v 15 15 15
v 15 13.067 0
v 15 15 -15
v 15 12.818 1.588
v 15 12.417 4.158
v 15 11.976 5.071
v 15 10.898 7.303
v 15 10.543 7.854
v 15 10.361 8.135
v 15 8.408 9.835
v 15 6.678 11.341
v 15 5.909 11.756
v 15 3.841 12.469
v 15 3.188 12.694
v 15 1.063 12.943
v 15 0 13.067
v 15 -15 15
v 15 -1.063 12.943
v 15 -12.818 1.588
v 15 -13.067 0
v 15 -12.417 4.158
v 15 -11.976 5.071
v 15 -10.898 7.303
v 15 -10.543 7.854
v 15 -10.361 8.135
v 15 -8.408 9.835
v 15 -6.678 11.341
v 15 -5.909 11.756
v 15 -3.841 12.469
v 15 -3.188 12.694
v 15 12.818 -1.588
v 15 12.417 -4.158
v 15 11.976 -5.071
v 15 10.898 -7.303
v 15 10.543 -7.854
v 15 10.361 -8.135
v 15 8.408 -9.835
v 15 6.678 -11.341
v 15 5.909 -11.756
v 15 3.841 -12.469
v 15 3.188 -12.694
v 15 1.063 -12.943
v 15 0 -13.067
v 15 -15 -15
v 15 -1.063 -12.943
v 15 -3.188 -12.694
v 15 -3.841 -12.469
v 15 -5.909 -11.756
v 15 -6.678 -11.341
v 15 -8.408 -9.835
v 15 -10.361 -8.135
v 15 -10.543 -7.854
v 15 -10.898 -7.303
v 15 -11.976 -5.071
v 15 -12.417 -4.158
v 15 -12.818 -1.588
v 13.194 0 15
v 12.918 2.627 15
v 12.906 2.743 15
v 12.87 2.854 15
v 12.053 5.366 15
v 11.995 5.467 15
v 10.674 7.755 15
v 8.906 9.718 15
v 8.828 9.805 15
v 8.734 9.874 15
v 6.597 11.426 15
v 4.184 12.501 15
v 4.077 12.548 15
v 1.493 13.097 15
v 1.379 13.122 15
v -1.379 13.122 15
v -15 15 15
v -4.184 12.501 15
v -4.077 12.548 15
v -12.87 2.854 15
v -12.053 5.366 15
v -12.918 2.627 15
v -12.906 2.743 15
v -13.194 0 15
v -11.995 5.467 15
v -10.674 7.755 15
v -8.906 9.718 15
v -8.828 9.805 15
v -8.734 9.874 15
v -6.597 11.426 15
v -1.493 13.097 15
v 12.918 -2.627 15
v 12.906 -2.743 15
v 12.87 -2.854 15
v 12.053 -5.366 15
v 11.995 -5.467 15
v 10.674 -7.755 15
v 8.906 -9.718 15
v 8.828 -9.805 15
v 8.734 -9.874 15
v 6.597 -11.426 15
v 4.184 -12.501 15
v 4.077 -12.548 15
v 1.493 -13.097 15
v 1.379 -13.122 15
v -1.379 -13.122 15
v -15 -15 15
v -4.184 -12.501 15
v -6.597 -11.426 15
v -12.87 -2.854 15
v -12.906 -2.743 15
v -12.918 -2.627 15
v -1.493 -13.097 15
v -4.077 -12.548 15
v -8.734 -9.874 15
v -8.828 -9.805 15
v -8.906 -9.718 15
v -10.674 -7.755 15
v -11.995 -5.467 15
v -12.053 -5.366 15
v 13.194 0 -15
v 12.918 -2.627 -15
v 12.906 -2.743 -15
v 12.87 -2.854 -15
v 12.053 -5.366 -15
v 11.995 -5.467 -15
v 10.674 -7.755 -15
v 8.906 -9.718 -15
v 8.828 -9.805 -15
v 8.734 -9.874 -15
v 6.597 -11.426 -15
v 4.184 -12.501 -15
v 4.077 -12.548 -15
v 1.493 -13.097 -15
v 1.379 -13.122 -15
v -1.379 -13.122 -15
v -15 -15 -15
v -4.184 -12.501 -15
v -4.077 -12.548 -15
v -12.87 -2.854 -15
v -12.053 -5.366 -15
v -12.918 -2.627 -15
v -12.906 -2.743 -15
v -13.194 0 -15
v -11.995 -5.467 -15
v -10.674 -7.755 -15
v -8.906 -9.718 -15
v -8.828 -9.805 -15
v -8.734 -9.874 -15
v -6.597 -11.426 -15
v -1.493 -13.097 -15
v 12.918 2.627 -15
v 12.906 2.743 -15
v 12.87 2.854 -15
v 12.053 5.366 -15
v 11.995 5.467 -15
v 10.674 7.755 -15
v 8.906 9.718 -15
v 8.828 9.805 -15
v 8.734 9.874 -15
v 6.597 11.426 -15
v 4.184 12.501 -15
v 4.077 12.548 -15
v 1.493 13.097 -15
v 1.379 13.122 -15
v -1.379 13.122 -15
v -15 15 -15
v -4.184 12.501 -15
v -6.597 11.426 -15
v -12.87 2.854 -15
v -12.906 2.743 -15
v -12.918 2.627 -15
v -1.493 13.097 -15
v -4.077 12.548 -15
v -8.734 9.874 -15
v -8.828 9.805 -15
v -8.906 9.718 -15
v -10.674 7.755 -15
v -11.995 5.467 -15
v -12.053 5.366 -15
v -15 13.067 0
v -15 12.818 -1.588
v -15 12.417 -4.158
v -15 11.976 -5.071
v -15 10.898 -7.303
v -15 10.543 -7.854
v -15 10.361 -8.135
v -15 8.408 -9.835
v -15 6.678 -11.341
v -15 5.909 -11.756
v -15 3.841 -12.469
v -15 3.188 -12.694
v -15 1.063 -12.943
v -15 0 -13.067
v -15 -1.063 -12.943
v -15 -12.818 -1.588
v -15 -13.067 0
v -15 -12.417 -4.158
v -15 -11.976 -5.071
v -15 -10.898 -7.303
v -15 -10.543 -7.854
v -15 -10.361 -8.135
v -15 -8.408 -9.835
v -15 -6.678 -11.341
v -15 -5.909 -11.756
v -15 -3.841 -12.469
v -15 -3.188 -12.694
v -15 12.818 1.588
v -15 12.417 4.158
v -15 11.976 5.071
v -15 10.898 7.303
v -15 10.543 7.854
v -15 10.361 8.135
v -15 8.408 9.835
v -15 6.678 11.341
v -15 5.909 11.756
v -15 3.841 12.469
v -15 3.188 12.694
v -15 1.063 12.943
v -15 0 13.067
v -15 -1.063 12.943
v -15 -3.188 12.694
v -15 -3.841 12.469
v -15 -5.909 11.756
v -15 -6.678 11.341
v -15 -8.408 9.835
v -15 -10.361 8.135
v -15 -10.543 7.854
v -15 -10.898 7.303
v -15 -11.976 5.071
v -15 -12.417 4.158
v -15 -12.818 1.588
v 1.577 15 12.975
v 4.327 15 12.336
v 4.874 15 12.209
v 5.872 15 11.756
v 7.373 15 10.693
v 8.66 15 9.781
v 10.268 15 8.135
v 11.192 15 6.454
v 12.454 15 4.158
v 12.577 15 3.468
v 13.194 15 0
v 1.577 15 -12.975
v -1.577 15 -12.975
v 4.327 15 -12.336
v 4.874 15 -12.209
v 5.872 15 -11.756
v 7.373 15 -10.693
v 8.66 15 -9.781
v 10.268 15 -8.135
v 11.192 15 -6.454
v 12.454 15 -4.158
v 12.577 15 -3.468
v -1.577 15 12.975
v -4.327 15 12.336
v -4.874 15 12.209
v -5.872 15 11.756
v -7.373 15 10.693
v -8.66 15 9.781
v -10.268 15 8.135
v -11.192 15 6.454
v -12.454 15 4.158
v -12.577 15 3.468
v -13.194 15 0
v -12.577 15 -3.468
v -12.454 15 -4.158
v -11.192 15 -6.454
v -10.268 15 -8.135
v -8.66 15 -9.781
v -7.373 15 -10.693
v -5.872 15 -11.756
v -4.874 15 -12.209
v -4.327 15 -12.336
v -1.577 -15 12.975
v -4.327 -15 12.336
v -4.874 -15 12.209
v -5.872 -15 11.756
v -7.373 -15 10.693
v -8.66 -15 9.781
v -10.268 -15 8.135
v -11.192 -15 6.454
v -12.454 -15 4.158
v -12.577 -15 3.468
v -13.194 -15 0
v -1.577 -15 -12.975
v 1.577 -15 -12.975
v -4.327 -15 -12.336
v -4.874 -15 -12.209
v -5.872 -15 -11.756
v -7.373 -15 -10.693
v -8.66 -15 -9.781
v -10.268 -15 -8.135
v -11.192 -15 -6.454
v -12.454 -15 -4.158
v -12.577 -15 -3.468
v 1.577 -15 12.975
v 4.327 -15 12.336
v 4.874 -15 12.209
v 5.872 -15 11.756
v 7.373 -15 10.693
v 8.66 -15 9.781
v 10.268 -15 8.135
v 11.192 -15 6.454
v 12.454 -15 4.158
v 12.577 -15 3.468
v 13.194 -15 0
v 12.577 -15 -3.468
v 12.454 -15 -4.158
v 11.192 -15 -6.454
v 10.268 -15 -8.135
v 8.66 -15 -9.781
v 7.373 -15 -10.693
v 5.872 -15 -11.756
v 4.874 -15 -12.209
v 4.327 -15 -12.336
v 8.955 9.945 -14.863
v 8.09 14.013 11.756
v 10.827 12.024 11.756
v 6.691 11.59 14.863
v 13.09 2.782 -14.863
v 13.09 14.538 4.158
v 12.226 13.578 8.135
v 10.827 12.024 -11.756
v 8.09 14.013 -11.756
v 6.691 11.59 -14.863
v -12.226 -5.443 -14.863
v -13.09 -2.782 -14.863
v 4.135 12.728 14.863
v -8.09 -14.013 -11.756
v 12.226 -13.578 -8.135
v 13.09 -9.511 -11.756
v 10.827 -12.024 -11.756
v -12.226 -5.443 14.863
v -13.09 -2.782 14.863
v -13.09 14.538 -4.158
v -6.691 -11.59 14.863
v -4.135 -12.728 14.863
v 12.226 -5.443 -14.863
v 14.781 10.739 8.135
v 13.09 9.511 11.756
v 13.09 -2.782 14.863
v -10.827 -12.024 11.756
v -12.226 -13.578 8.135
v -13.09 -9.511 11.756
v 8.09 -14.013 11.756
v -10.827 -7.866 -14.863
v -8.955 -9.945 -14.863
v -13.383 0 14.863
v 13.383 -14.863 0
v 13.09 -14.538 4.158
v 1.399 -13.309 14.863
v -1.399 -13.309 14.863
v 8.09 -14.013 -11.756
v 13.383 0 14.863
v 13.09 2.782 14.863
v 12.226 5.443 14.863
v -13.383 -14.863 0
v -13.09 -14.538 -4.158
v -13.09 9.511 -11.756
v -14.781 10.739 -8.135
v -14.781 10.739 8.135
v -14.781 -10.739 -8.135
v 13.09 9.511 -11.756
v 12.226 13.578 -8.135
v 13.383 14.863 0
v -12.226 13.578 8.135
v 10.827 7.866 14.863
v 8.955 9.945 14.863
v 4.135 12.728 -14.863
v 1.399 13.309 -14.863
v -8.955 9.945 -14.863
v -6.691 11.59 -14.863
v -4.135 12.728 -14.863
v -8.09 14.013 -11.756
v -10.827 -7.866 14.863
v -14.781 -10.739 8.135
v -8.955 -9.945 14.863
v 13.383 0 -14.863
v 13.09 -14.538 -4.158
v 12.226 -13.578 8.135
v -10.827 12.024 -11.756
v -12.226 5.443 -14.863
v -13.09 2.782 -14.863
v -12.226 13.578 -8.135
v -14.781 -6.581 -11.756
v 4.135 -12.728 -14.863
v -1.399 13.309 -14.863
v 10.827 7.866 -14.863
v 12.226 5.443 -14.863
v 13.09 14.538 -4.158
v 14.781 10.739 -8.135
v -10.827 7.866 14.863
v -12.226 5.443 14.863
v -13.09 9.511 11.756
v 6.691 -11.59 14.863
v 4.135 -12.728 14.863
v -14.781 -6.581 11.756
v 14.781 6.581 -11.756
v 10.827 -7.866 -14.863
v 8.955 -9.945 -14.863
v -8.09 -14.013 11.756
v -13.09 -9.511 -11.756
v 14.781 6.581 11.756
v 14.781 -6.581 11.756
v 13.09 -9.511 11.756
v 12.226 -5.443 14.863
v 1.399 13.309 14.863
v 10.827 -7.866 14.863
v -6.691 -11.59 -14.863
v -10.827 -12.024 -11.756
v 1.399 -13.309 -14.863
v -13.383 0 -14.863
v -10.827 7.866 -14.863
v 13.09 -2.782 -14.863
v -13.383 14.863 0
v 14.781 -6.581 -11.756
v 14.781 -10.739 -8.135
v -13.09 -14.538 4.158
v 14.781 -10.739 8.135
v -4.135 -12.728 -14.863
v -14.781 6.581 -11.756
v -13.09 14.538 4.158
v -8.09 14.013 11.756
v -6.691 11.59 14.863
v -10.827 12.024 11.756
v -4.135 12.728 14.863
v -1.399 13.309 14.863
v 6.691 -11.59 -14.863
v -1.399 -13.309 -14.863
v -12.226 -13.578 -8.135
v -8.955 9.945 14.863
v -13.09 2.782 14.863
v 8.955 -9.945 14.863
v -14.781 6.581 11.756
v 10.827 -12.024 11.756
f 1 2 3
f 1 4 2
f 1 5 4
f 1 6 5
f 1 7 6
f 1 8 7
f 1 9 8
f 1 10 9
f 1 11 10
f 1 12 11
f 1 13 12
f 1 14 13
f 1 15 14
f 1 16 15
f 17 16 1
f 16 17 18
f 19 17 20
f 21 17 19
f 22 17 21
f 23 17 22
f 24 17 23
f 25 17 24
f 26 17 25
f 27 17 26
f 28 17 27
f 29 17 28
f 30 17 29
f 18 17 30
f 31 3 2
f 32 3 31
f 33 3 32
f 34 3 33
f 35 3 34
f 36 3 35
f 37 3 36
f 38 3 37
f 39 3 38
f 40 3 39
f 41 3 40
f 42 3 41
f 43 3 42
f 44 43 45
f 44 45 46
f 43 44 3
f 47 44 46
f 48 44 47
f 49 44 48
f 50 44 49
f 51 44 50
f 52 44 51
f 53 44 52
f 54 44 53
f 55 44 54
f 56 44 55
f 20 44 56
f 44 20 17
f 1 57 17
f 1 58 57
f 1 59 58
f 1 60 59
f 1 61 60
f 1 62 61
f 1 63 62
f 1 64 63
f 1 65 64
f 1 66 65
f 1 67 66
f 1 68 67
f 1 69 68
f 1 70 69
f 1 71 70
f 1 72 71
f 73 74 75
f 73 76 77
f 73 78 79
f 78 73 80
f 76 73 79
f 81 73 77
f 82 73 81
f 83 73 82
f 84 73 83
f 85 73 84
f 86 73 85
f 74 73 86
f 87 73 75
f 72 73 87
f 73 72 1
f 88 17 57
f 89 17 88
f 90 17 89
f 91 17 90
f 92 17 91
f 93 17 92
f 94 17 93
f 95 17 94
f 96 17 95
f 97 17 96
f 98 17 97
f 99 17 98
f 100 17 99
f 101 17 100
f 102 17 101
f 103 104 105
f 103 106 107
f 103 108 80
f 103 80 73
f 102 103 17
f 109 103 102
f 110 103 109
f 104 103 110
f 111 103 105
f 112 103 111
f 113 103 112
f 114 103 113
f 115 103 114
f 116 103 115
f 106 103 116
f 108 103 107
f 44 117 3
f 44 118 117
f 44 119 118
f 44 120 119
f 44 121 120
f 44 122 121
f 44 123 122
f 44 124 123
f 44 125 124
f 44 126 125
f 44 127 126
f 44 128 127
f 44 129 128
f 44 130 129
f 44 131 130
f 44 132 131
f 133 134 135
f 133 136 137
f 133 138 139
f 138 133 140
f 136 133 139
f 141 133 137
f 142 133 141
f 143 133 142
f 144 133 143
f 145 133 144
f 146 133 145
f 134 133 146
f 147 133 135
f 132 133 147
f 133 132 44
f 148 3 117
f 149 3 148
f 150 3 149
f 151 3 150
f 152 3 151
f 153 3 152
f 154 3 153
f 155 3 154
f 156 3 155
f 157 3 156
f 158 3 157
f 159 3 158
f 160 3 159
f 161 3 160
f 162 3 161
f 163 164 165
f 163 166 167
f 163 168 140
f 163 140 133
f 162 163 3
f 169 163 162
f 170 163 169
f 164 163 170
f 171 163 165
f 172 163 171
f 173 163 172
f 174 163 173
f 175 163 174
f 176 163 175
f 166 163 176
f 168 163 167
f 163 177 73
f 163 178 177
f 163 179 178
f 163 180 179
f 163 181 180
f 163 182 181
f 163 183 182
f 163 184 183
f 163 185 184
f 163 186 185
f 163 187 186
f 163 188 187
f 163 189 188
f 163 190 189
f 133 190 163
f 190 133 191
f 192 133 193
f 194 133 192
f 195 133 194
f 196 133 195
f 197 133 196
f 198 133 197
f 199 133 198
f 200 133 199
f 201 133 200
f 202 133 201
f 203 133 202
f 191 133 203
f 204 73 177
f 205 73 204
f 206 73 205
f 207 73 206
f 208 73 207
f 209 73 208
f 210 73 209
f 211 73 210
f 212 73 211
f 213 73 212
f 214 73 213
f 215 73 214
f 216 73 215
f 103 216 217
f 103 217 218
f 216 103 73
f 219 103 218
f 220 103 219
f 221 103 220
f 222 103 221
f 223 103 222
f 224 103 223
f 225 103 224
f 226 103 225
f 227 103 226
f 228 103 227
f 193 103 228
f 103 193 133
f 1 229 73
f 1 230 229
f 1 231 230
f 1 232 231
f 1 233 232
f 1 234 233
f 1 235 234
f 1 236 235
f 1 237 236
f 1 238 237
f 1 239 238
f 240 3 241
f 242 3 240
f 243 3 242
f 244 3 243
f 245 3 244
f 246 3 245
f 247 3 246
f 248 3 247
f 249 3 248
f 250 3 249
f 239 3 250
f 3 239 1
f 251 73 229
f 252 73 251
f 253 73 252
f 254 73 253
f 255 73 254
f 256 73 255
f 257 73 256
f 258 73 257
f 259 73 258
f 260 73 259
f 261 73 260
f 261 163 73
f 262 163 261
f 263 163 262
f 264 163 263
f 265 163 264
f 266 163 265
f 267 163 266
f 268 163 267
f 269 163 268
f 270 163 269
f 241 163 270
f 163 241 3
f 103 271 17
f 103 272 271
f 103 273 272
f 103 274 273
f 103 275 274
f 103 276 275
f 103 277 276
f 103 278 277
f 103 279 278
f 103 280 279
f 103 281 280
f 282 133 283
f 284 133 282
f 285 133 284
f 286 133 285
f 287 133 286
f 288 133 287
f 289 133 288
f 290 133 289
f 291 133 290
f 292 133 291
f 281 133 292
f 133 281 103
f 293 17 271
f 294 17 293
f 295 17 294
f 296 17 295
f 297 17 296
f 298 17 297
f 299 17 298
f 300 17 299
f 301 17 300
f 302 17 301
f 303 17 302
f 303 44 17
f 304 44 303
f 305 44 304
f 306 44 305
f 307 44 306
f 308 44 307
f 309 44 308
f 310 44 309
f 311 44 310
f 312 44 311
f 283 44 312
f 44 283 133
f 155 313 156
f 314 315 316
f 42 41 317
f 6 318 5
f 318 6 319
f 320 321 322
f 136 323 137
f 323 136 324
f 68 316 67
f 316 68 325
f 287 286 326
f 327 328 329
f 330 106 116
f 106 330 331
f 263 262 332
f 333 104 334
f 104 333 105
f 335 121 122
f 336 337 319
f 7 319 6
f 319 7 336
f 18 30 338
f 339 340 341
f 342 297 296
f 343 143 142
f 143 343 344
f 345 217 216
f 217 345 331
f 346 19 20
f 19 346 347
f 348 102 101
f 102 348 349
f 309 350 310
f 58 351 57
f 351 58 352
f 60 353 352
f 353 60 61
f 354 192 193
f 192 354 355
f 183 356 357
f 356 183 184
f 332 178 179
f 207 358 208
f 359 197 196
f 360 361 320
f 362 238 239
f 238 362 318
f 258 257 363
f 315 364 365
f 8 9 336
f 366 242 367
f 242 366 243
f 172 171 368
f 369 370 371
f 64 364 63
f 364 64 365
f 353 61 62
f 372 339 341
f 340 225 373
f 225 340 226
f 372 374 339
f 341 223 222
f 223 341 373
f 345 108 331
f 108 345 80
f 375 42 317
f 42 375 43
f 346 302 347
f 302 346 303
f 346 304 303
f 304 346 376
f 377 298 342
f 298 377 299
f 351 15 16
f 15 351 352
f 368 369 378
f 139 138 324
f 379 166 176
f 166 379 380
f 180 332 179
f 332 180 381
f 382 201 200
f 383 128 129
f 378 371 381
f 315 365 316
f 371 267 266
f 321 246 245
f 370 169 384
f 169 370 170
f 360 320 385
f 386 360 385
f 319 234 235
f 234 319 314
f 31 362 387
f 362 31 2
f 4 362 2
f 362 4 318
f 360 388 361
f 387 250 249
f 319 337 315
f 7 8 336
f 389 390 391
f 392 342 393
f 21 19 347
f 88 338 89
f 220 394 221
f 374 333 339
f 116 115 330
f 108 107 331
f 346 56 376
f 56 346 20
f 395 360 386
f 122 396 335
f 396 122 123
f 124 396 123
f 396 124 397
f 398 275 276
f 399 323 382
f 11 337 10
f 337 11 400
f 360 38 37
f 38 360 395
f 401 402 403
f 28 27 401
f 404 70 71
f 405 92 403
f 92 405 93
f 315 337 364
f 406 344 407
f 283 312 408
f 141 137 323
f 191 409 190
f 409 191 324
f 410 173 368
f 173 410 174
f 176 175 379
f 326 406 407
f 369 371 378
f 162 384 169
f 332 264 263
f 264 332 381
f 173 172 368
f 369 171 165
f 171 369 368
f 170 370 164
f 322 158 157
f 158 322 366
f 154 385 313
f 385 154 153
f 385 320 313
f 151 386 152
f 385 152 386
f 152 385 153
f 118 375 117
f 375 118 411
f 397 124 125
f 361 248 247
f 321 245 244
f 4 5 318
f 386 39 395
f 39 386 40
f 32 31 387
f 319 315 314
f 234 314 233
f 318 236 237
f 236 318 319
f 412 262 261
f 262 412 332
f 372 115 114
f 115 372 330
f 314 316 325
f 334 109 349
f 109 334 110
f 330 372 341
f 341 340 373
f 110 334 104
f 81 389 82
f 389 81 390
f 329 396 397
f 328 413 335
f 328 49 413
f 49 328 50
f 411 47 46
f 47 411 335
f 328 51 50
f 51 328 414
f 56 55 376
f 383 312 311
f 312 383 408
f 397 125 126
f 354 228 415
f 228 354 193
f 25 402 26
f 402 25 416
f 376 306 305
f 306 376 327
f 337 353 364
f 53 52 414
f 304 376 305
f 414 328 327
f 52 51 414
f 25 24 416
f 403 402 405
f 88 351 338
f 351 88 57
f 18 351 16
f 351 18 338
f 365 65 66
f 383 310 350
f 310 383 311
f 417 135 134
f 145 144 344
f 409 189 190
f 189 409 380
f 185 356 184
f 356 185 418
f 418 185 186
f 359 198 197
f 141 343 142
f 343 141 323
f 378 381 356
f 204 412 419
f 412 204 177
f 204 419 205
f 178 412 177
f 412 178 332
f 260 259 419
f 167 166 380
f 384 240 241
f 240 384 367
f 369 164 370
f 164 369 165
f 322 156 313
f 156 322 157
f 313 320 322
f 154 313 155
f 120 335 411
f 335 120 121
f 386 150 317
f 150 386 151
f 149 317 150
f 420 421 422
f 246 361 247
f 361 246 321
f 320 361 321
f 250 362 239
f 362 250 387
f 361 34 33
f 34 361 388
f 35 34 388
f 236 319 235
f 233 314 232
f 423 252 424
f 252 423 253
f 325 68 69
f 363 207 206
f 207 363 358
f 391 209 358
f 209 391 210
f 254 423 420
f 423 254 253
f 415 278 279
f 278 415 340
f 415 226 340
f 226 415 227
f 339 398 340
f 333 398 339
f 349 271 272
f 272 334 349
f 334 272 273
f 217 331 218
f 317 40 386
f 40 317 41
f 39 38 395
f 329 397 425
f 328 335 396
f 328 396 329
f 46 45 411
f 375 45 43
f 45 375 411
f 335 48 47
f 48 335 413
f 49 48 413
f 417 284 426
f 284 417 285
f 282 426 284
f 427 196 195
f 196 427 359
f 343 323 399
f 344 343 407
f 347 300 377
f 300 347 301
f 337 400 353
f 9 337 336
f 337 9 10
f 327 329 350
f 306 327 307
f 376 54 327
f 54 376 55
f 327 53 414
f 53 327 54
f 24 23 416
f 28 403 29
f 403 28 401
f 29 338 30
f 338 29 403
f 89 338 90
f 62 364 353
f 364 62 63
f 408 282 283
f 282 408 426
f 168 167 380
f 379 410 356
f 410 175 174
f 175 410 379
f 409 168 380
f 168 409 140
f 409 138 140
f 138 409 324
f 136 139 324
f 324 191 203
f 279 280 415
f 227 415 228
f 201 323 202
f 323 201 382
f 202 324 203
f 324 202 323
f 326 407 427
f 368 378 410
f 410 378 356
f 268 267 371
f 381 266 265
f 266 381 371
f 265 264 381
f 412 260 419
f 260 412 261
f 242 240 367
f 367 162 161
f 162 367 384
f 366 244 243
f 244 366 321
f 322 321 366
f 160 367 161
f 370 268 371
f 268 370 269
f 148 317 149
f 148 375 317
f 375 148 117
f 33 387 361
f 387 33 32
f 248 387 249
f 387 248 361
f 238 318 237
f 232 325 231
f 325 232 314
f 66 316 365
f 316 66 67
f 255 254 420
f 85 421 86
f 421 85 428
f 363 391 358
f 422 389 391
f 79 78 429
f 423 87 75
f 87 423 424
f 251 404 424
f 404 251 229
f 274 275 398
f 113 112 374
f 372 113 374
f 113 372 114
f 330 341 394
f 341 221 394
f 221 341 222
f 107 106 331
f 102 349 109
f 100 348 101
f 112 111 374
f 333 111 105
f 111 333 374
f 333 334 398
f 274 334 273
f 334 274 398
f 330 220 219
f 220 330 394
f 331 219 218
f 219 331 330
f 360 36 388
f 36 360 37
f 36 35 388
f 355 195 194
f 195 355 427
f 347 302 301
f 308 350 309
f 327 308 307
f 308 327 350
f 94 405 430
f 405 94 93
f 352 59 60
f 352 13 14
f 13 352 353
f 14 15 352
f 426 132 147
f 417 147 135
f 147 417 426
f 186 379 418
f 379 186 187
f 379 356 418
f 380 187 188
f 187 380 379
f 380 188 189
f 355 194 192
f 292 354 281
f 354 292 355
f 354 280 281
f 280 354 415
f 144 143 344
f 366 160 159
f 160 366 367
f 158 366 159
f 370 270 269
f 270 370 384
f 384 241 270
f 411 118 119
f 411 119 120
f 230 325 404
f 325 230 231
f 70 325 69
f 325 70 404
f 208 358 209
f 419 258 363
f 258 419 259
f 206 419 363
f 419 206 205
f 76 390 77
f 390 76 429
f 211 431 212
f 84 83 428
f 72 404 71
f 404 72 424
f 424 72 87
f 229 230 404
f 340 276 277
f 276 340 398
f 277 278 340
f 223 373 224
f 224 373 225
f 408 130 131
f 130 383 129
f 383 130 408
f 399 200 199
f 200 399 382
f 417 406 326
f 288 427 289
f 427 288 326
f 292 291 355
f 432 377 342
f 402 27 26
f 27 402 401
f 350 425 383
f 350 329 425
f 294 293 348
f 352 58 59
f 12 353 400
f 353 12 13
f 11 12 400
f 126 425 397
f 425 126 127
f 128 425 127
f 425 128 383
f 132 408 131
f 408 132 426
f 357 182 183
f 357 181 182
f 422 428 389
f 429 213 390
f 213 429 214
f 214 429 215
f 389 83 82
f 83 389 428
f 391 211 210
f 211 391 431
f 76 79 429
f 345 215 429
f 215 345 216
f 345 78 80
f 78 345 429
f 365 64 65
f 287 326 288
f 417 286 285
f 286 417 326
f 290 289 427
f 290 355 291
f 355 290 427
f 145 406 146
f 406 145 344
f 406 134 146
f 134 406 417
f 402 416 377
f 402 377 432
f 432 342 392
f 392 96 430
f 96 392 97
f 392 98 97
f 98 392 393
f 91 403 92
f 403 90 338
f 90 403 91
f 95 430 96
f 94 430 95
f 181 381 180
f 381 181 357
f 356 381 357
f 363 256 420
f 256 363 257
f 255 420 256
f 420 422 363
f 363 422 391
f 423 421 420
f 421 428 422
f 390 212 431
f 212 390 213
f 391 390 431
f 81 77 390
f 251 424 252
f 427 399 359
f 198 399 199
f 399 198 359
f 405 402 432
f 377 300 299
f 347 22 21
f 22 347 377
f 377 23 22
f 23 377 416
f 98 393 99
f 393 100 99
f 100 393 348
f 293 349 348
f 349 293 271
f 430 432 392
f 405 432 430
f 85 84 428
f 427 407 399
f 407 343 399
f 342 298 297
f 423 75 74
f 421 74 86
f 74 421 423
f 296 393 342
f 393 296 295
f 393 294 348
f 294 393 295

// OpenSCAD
module example004()
{
	difference() {
		cube(size=30, center = true);
		sphere(20);
	}
}

example004();
